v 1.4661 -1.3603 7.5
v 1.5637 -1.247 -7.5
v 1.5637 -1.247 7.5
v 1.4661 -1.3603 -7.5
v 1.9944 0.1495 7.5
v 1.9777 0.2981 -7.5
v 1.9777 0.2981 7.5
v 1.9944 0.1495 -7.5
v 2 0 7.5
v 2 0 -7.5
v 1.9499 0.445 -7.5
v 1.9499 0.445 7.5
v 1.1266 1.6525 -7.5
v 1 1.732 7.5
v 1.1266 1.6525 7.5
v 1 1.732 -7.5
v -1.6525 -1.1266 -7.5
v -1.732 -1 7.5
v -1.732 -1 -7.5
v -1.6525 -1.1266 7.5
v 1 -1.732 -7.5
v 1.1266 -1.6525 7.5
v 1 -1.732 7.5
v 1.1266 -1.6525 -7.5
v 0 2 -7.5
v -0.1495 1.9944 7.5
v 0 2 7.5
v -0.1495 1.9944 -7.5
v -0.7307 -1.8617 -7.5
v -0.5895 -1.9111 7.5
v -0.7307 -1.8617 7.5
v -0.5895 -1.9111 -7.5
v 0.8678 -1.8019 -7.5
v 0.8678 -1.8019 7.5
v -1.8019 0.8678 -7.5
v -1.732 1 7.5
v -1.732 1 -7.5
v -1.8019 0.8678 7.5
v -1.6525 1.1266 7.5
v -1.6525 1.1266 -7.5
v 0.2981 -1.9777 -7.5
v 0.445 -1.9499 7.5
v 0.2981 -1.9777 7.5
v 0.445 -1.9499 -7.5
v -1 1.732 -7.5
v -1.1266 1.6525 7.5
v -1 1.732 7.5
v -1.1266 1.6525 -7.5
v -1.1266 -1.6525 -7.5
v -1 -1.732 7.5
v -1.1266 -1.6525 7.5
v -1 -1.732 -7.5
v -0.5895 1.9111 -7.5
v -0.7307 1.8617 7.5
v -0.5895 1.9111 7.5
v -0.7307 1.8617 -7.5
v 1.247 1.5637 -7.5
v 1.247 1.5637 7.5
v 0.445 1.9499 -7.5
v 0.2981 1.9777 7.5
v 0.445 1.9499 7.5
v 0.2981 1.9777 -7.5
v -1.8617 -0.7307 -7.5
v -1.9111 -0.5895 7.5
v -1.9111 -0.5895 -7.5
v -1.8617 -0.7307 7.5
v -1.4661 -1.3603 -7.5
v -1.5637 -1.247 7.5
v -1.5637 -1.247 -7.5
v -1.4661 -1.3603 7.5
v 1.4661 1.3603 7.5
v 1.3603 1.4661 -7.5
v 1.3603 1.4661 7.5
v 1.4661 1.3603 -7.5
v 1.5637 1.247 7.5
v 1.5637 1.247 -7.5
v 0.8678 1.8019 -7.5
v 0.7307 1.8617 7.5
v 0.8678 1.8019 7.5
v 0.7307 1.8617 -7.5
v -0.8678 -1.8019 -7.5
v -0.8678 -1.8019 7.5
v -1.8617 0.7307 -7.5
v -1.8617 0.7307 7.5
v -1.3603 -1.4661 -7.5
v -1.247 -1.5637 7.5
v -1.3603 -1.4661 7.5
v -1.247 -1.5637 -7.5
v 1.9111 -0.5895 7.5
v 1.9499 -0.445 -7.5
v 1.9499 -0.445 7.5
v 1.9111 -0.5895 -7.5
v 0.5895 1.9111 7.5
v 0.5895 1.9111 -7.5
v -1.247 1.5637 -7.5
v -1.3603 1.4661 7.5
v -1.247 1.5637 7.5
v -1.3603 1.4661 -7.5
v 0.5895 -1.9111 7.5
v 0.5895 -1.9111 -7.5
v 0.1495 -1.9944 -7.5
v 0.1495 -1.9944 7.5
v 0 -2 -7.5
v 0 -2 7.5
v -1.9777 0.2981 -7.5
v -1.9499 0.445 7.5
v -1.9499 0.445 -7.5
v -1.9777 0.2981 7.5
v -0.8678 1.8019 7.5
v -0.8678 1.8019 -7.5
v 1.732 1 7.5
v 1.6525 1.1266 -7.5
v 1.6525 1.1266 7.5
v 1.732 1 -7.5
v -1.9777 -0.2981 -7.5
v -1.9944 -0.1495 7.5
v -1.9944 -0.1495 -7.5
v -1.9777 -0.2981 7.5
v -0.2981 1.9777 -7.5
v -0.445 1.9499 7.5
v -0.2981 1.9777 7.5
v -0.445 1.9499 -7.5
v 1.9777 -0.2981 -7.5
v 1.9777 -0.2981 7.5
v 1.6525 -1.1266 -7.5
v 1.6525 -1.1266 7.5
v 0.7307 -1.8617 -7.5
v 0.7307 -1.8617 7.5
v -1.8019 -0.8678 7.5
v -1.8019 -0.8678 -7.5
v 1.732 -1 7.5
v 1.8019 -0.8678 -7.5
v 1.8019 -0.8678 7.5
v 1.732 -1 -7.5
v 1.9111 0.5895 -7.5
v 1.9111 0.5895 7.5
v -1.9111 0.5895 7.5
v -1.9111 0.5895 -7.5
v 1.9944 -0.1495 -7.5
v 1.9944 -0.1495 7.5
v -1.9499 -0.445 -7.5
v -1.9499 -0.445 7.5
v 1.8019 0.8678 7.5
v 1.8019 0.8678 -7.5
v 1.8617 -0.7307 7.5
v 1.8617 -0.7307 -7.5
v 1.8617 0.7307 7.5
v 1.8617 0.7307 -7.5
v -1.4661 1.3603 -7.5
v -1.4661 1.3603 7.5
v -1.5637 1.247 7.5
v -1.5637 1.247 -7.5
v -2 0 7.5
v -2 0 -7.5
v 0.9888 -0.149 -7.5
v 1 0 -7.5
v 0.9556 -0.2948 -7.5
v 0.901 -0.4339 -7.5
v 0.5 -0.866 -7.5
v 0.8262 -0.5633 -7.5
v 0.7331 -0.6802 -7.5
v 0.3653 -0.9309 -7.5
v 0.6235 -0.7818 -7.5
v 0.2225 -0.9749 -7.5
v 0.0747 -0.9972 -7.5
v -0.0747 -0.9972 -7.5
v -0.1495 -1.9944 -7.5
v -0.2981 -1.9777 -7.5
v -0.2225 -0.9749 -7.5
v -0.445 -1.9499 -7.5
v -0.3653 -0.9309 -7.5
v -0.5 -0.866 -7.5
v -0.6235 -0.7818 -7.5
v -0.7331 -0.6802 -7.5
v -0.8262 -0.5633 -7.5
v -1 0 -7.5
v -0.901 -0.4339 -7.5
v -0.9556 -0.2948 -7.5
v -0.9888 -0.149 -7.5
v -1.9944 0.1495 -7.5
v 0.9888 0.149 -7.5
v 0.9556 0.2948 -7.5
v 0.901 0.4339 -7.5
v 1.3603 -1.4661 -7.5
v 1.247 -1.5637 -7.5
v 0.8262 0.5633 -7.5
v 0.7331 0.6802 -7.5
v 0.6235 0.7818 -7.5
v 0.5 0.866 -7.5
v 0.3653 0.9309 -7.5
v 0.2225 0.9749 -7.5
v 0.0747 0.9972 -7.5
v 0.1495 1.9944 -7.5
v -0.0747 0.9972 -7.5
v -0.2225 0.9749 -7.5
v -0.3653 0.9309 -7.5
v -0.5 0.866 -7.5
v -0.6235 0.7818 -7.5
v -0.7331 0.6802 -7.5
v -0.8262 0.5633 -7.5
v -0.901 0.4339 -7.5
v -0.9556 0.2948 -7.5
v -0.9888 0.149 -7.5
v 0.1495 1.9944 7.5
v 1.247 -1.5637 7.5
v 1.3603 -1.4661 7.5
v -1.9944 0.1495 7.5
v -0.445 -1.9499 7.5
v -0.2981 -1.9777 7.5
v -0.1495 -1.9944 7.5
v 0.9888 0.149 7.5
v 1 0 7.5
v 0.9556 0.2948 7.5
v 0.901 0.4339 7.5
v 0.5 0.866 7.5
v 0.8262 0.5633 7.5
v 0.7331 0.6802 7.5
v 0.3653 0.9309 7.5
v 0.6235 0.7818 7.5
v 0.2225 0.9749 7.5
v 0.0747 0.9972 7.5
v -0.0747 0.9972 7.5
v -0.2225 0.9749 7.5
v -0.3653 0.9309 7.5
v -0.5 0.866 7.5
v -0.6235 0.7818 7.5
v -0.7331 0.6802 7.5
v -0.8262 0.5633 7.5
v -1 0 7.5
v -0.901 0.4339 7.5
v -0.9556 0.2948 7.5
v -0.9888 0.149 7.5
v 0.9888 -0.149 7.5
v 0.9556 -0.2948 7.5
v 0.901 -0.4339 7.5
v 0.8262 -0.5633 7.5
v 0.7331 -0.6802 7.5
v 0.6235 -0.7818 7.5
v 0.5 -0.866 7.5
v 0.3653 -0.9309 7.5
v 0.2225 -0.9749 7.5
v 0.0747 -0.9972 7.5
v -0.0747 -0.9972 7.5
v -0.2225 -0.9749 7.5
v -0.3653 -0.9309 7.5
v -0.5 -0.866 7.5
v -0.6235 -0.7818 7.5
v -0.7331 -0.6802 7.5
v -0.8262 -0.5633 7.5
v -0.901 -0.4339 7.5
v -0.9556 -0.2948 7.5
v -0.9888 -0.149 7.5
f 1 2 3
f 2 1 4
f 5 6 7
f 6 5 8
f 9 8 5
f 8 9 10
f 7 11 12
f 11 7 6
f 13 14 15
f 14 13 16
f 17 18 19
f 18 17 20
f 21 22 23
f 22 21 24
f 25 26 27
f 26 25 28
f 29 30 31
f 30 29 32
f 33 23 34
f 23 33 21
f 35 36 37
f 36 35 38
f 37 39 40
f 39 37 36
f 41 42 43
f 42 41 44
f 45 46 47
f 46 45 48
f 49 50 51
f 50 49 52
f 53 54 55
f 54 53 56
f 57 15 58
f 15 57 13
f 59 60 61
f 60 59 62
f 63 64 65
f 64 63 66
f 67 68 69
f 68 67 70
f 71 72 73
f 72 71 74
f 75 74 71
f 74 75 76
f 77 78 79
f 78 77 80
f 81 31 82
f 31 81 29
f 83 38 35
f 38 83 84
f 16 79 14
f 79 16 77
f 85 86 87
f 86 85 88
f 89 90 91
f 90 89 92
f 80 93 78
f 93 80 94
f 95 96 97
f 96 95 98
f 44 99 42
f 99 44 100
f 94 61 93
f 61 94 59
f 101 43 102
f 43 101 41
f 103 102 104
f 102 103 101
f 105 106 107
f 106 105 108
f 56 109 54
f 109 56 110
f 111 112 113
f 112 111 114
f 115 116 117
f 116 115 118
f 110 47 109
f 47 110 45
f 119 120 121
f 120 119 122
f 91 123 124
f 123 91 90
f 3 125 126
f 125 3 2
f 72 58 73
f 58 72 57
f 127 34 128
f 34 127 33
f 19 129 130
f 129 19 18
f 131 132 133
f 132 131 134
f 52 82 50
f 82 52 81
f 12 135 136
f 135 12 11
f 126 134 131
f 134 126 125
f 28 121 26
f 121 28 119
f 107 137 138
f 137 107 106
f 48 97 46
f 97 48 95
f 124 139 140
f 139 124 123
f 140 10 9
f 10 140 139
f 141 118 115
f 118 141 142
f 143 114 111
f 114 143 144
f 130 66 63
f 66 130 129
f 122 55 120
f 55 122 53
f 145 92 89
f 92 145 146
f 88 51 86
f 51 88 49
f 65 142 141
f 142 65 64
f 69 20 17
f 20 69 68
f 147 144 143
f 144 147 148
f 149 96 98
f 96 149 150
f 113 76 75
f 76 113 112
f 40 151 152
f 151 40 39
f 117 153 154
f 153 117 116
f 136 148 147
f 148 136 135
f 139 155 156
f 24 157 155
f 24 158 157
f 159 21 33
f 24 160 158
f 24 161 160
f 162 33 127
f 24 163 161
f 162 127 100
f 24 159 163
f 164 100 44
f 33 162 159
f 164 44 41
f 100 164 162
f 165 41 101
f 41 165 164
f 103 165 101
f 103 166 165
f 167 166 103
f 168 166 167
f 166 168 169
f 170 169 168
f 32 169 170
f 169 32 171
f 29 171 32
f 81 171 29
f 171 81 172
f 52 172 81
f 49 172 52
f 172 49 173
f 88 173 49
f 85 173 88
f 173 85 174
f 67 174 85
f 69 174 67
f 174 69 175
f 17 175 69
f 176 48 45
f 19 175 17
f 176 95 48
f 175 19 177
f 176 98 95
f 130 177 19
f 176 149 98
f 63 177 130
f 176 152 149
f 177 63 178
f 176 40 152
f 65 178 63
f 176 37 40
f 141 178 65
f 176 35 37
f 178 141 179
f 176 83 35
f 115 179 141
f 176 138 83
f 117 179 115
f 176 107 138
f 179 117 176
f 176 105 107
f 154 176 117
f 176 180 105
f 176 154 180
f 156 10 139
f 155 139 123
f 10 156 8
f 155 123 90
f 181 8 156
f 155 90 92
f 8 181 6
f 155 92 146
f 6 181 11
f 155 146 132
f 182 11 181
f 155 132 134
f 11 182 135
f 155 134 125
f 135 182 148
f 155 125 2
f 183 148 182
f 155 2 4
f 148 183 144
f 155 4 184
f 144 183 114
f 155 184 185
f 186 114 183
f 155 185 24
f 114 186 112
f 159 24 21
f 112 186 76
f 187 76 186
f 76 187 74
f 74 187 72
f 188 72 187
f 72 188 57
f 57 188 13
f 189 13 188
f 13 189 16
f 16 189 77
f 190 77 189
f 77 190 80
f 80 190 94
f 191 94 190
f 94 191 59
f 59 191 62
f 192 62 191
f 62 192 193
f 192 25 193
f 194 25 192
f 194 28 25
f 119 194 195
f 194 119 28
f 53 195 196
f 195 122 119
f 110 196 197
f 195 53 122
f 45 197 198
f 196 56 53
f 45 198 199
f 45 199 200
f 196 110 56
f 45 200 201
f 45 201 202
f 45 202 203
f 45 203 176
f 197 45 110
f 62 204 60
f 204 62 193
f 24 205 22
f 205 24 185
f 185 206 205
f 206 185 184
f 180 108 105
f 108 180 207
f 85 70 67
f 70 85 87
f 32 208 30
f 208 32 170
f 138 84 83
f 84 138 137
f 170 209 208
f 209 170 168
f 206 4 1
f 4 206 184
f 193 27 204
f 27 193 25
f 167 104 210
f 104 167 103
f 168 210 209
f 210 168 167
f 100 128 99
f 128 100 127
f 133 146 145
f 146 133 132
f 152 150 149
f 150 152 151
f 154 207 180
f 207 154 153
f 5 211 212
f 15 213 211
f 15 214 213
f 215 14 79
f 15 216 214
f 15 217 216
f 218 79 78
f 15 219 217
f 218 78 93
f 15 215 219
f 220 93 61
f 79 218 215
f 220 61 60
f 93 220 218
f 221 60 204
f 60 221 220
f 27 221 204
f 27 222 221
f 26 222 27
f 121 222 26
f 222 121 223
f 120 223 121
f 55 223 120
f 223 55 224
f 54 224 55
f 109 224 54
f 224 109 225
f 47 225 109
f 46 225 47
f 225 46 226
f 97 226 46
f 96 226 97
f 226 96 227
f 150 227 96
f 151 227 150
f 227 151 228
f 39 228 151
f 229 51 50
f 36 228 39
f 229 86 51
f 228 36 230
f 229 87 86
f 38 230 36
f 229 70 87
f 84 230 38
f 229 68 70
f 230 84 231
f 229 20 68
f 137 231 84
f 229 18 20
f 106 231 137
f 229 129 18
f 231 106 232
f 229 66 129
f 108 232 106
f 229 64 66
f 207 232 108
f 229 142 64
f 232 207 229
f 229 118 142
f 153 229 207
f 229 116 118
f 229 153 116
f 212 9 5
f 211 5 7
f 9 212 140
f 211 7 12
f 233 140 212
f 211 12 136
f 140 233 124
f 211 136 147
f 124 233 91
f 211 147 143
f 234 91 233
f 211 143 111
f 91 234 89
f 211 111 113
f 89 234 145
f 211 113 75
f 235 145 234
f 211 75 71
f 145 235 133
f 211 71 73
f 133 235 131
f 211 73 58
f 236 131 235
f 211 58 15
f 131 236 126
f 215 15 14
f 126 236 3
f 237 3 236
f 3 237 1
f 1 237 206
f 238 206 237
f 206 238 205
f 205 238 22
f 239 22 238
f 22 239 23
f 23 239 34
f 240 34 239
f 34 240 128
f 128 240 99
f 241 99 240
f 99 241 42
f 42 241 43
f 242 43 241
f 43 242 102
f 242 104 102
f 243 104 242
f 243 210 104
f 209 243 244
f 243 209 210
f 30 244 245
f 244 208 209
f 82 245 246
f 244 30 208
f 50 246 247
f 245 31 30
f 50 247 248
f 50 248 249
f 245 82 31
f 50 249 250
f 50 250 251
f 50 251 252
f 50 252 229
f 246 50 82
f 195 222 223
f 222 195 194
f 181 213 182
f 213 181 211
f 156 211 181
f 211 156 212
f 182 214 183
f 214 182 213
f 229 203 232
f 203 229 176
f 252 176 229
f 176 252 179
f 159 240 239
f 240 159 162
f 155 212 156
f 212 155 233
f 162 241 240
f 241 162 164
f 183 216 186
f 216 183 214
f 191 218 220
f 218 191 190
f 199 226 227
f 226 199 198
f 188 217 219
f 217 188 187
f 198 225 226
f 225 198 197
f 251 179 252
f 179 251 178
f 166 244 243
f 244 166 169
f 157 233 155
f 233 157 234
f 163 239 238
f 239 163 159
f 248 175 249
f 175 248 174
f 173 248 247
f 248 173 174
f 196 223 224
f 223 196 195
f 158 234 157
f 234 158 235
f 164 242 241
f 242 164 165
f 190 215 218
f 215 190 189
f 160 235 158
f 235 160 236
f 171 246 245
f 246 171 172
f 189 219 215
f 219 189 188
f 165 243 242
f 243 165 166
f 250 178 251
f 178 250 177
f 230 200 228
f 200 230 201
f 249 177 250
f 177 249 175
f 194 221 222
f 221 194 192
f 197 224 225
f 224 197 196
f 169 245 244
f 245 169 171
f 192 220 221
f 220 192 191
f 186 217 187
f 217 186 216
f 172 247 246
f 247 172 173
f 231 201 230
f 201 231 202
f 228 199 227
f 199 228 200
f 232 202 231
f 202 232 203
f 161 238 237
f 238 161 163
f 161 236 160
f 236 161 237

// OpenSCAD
// PTFE sleeving (tubing) - single connected solid

// Parameters
length = 15; //[7.5:30:1]
outer_diameter = 4; //[2:8:0.1]
inner_diameter = 2; //[1:6:0.1]
forced_id = 0; //[0:6:0.1]
center = true; //[0:1:1]
overlap = 1; //[0.5:2:0.1]

// Smoothness
$fa = 3;
$fs = 0.15;
$fn = 0;

module tubing() {
    wall_min = 0.2;

    od = max(outer_diameter, 2*wall_min);
    id_in = (forced_id > 0) ? forced_id : inner_diameter;

    // Clamp ID so the tube always has a positive wall thickness
    id_safe = min(max(id_in, 0), od - 2*wall_min);

    // Ensure the inner cutter fully passes through regardless of centering
    h_outer = length;
    h_inner = length + 2*overlap;

    z_shift = center ? 0 : -overlap; // formulas only; guarantees through-cut when center=false

    color([0.85, 0.85, 0.8])
    difference() {
        cylinder(h=h_outer, r=od/2, center=center);
        translate([0, 0, z_shift])
            cylinder(h=h_inner, r=id_safe/2, center=center);
    }
}

tubing();
